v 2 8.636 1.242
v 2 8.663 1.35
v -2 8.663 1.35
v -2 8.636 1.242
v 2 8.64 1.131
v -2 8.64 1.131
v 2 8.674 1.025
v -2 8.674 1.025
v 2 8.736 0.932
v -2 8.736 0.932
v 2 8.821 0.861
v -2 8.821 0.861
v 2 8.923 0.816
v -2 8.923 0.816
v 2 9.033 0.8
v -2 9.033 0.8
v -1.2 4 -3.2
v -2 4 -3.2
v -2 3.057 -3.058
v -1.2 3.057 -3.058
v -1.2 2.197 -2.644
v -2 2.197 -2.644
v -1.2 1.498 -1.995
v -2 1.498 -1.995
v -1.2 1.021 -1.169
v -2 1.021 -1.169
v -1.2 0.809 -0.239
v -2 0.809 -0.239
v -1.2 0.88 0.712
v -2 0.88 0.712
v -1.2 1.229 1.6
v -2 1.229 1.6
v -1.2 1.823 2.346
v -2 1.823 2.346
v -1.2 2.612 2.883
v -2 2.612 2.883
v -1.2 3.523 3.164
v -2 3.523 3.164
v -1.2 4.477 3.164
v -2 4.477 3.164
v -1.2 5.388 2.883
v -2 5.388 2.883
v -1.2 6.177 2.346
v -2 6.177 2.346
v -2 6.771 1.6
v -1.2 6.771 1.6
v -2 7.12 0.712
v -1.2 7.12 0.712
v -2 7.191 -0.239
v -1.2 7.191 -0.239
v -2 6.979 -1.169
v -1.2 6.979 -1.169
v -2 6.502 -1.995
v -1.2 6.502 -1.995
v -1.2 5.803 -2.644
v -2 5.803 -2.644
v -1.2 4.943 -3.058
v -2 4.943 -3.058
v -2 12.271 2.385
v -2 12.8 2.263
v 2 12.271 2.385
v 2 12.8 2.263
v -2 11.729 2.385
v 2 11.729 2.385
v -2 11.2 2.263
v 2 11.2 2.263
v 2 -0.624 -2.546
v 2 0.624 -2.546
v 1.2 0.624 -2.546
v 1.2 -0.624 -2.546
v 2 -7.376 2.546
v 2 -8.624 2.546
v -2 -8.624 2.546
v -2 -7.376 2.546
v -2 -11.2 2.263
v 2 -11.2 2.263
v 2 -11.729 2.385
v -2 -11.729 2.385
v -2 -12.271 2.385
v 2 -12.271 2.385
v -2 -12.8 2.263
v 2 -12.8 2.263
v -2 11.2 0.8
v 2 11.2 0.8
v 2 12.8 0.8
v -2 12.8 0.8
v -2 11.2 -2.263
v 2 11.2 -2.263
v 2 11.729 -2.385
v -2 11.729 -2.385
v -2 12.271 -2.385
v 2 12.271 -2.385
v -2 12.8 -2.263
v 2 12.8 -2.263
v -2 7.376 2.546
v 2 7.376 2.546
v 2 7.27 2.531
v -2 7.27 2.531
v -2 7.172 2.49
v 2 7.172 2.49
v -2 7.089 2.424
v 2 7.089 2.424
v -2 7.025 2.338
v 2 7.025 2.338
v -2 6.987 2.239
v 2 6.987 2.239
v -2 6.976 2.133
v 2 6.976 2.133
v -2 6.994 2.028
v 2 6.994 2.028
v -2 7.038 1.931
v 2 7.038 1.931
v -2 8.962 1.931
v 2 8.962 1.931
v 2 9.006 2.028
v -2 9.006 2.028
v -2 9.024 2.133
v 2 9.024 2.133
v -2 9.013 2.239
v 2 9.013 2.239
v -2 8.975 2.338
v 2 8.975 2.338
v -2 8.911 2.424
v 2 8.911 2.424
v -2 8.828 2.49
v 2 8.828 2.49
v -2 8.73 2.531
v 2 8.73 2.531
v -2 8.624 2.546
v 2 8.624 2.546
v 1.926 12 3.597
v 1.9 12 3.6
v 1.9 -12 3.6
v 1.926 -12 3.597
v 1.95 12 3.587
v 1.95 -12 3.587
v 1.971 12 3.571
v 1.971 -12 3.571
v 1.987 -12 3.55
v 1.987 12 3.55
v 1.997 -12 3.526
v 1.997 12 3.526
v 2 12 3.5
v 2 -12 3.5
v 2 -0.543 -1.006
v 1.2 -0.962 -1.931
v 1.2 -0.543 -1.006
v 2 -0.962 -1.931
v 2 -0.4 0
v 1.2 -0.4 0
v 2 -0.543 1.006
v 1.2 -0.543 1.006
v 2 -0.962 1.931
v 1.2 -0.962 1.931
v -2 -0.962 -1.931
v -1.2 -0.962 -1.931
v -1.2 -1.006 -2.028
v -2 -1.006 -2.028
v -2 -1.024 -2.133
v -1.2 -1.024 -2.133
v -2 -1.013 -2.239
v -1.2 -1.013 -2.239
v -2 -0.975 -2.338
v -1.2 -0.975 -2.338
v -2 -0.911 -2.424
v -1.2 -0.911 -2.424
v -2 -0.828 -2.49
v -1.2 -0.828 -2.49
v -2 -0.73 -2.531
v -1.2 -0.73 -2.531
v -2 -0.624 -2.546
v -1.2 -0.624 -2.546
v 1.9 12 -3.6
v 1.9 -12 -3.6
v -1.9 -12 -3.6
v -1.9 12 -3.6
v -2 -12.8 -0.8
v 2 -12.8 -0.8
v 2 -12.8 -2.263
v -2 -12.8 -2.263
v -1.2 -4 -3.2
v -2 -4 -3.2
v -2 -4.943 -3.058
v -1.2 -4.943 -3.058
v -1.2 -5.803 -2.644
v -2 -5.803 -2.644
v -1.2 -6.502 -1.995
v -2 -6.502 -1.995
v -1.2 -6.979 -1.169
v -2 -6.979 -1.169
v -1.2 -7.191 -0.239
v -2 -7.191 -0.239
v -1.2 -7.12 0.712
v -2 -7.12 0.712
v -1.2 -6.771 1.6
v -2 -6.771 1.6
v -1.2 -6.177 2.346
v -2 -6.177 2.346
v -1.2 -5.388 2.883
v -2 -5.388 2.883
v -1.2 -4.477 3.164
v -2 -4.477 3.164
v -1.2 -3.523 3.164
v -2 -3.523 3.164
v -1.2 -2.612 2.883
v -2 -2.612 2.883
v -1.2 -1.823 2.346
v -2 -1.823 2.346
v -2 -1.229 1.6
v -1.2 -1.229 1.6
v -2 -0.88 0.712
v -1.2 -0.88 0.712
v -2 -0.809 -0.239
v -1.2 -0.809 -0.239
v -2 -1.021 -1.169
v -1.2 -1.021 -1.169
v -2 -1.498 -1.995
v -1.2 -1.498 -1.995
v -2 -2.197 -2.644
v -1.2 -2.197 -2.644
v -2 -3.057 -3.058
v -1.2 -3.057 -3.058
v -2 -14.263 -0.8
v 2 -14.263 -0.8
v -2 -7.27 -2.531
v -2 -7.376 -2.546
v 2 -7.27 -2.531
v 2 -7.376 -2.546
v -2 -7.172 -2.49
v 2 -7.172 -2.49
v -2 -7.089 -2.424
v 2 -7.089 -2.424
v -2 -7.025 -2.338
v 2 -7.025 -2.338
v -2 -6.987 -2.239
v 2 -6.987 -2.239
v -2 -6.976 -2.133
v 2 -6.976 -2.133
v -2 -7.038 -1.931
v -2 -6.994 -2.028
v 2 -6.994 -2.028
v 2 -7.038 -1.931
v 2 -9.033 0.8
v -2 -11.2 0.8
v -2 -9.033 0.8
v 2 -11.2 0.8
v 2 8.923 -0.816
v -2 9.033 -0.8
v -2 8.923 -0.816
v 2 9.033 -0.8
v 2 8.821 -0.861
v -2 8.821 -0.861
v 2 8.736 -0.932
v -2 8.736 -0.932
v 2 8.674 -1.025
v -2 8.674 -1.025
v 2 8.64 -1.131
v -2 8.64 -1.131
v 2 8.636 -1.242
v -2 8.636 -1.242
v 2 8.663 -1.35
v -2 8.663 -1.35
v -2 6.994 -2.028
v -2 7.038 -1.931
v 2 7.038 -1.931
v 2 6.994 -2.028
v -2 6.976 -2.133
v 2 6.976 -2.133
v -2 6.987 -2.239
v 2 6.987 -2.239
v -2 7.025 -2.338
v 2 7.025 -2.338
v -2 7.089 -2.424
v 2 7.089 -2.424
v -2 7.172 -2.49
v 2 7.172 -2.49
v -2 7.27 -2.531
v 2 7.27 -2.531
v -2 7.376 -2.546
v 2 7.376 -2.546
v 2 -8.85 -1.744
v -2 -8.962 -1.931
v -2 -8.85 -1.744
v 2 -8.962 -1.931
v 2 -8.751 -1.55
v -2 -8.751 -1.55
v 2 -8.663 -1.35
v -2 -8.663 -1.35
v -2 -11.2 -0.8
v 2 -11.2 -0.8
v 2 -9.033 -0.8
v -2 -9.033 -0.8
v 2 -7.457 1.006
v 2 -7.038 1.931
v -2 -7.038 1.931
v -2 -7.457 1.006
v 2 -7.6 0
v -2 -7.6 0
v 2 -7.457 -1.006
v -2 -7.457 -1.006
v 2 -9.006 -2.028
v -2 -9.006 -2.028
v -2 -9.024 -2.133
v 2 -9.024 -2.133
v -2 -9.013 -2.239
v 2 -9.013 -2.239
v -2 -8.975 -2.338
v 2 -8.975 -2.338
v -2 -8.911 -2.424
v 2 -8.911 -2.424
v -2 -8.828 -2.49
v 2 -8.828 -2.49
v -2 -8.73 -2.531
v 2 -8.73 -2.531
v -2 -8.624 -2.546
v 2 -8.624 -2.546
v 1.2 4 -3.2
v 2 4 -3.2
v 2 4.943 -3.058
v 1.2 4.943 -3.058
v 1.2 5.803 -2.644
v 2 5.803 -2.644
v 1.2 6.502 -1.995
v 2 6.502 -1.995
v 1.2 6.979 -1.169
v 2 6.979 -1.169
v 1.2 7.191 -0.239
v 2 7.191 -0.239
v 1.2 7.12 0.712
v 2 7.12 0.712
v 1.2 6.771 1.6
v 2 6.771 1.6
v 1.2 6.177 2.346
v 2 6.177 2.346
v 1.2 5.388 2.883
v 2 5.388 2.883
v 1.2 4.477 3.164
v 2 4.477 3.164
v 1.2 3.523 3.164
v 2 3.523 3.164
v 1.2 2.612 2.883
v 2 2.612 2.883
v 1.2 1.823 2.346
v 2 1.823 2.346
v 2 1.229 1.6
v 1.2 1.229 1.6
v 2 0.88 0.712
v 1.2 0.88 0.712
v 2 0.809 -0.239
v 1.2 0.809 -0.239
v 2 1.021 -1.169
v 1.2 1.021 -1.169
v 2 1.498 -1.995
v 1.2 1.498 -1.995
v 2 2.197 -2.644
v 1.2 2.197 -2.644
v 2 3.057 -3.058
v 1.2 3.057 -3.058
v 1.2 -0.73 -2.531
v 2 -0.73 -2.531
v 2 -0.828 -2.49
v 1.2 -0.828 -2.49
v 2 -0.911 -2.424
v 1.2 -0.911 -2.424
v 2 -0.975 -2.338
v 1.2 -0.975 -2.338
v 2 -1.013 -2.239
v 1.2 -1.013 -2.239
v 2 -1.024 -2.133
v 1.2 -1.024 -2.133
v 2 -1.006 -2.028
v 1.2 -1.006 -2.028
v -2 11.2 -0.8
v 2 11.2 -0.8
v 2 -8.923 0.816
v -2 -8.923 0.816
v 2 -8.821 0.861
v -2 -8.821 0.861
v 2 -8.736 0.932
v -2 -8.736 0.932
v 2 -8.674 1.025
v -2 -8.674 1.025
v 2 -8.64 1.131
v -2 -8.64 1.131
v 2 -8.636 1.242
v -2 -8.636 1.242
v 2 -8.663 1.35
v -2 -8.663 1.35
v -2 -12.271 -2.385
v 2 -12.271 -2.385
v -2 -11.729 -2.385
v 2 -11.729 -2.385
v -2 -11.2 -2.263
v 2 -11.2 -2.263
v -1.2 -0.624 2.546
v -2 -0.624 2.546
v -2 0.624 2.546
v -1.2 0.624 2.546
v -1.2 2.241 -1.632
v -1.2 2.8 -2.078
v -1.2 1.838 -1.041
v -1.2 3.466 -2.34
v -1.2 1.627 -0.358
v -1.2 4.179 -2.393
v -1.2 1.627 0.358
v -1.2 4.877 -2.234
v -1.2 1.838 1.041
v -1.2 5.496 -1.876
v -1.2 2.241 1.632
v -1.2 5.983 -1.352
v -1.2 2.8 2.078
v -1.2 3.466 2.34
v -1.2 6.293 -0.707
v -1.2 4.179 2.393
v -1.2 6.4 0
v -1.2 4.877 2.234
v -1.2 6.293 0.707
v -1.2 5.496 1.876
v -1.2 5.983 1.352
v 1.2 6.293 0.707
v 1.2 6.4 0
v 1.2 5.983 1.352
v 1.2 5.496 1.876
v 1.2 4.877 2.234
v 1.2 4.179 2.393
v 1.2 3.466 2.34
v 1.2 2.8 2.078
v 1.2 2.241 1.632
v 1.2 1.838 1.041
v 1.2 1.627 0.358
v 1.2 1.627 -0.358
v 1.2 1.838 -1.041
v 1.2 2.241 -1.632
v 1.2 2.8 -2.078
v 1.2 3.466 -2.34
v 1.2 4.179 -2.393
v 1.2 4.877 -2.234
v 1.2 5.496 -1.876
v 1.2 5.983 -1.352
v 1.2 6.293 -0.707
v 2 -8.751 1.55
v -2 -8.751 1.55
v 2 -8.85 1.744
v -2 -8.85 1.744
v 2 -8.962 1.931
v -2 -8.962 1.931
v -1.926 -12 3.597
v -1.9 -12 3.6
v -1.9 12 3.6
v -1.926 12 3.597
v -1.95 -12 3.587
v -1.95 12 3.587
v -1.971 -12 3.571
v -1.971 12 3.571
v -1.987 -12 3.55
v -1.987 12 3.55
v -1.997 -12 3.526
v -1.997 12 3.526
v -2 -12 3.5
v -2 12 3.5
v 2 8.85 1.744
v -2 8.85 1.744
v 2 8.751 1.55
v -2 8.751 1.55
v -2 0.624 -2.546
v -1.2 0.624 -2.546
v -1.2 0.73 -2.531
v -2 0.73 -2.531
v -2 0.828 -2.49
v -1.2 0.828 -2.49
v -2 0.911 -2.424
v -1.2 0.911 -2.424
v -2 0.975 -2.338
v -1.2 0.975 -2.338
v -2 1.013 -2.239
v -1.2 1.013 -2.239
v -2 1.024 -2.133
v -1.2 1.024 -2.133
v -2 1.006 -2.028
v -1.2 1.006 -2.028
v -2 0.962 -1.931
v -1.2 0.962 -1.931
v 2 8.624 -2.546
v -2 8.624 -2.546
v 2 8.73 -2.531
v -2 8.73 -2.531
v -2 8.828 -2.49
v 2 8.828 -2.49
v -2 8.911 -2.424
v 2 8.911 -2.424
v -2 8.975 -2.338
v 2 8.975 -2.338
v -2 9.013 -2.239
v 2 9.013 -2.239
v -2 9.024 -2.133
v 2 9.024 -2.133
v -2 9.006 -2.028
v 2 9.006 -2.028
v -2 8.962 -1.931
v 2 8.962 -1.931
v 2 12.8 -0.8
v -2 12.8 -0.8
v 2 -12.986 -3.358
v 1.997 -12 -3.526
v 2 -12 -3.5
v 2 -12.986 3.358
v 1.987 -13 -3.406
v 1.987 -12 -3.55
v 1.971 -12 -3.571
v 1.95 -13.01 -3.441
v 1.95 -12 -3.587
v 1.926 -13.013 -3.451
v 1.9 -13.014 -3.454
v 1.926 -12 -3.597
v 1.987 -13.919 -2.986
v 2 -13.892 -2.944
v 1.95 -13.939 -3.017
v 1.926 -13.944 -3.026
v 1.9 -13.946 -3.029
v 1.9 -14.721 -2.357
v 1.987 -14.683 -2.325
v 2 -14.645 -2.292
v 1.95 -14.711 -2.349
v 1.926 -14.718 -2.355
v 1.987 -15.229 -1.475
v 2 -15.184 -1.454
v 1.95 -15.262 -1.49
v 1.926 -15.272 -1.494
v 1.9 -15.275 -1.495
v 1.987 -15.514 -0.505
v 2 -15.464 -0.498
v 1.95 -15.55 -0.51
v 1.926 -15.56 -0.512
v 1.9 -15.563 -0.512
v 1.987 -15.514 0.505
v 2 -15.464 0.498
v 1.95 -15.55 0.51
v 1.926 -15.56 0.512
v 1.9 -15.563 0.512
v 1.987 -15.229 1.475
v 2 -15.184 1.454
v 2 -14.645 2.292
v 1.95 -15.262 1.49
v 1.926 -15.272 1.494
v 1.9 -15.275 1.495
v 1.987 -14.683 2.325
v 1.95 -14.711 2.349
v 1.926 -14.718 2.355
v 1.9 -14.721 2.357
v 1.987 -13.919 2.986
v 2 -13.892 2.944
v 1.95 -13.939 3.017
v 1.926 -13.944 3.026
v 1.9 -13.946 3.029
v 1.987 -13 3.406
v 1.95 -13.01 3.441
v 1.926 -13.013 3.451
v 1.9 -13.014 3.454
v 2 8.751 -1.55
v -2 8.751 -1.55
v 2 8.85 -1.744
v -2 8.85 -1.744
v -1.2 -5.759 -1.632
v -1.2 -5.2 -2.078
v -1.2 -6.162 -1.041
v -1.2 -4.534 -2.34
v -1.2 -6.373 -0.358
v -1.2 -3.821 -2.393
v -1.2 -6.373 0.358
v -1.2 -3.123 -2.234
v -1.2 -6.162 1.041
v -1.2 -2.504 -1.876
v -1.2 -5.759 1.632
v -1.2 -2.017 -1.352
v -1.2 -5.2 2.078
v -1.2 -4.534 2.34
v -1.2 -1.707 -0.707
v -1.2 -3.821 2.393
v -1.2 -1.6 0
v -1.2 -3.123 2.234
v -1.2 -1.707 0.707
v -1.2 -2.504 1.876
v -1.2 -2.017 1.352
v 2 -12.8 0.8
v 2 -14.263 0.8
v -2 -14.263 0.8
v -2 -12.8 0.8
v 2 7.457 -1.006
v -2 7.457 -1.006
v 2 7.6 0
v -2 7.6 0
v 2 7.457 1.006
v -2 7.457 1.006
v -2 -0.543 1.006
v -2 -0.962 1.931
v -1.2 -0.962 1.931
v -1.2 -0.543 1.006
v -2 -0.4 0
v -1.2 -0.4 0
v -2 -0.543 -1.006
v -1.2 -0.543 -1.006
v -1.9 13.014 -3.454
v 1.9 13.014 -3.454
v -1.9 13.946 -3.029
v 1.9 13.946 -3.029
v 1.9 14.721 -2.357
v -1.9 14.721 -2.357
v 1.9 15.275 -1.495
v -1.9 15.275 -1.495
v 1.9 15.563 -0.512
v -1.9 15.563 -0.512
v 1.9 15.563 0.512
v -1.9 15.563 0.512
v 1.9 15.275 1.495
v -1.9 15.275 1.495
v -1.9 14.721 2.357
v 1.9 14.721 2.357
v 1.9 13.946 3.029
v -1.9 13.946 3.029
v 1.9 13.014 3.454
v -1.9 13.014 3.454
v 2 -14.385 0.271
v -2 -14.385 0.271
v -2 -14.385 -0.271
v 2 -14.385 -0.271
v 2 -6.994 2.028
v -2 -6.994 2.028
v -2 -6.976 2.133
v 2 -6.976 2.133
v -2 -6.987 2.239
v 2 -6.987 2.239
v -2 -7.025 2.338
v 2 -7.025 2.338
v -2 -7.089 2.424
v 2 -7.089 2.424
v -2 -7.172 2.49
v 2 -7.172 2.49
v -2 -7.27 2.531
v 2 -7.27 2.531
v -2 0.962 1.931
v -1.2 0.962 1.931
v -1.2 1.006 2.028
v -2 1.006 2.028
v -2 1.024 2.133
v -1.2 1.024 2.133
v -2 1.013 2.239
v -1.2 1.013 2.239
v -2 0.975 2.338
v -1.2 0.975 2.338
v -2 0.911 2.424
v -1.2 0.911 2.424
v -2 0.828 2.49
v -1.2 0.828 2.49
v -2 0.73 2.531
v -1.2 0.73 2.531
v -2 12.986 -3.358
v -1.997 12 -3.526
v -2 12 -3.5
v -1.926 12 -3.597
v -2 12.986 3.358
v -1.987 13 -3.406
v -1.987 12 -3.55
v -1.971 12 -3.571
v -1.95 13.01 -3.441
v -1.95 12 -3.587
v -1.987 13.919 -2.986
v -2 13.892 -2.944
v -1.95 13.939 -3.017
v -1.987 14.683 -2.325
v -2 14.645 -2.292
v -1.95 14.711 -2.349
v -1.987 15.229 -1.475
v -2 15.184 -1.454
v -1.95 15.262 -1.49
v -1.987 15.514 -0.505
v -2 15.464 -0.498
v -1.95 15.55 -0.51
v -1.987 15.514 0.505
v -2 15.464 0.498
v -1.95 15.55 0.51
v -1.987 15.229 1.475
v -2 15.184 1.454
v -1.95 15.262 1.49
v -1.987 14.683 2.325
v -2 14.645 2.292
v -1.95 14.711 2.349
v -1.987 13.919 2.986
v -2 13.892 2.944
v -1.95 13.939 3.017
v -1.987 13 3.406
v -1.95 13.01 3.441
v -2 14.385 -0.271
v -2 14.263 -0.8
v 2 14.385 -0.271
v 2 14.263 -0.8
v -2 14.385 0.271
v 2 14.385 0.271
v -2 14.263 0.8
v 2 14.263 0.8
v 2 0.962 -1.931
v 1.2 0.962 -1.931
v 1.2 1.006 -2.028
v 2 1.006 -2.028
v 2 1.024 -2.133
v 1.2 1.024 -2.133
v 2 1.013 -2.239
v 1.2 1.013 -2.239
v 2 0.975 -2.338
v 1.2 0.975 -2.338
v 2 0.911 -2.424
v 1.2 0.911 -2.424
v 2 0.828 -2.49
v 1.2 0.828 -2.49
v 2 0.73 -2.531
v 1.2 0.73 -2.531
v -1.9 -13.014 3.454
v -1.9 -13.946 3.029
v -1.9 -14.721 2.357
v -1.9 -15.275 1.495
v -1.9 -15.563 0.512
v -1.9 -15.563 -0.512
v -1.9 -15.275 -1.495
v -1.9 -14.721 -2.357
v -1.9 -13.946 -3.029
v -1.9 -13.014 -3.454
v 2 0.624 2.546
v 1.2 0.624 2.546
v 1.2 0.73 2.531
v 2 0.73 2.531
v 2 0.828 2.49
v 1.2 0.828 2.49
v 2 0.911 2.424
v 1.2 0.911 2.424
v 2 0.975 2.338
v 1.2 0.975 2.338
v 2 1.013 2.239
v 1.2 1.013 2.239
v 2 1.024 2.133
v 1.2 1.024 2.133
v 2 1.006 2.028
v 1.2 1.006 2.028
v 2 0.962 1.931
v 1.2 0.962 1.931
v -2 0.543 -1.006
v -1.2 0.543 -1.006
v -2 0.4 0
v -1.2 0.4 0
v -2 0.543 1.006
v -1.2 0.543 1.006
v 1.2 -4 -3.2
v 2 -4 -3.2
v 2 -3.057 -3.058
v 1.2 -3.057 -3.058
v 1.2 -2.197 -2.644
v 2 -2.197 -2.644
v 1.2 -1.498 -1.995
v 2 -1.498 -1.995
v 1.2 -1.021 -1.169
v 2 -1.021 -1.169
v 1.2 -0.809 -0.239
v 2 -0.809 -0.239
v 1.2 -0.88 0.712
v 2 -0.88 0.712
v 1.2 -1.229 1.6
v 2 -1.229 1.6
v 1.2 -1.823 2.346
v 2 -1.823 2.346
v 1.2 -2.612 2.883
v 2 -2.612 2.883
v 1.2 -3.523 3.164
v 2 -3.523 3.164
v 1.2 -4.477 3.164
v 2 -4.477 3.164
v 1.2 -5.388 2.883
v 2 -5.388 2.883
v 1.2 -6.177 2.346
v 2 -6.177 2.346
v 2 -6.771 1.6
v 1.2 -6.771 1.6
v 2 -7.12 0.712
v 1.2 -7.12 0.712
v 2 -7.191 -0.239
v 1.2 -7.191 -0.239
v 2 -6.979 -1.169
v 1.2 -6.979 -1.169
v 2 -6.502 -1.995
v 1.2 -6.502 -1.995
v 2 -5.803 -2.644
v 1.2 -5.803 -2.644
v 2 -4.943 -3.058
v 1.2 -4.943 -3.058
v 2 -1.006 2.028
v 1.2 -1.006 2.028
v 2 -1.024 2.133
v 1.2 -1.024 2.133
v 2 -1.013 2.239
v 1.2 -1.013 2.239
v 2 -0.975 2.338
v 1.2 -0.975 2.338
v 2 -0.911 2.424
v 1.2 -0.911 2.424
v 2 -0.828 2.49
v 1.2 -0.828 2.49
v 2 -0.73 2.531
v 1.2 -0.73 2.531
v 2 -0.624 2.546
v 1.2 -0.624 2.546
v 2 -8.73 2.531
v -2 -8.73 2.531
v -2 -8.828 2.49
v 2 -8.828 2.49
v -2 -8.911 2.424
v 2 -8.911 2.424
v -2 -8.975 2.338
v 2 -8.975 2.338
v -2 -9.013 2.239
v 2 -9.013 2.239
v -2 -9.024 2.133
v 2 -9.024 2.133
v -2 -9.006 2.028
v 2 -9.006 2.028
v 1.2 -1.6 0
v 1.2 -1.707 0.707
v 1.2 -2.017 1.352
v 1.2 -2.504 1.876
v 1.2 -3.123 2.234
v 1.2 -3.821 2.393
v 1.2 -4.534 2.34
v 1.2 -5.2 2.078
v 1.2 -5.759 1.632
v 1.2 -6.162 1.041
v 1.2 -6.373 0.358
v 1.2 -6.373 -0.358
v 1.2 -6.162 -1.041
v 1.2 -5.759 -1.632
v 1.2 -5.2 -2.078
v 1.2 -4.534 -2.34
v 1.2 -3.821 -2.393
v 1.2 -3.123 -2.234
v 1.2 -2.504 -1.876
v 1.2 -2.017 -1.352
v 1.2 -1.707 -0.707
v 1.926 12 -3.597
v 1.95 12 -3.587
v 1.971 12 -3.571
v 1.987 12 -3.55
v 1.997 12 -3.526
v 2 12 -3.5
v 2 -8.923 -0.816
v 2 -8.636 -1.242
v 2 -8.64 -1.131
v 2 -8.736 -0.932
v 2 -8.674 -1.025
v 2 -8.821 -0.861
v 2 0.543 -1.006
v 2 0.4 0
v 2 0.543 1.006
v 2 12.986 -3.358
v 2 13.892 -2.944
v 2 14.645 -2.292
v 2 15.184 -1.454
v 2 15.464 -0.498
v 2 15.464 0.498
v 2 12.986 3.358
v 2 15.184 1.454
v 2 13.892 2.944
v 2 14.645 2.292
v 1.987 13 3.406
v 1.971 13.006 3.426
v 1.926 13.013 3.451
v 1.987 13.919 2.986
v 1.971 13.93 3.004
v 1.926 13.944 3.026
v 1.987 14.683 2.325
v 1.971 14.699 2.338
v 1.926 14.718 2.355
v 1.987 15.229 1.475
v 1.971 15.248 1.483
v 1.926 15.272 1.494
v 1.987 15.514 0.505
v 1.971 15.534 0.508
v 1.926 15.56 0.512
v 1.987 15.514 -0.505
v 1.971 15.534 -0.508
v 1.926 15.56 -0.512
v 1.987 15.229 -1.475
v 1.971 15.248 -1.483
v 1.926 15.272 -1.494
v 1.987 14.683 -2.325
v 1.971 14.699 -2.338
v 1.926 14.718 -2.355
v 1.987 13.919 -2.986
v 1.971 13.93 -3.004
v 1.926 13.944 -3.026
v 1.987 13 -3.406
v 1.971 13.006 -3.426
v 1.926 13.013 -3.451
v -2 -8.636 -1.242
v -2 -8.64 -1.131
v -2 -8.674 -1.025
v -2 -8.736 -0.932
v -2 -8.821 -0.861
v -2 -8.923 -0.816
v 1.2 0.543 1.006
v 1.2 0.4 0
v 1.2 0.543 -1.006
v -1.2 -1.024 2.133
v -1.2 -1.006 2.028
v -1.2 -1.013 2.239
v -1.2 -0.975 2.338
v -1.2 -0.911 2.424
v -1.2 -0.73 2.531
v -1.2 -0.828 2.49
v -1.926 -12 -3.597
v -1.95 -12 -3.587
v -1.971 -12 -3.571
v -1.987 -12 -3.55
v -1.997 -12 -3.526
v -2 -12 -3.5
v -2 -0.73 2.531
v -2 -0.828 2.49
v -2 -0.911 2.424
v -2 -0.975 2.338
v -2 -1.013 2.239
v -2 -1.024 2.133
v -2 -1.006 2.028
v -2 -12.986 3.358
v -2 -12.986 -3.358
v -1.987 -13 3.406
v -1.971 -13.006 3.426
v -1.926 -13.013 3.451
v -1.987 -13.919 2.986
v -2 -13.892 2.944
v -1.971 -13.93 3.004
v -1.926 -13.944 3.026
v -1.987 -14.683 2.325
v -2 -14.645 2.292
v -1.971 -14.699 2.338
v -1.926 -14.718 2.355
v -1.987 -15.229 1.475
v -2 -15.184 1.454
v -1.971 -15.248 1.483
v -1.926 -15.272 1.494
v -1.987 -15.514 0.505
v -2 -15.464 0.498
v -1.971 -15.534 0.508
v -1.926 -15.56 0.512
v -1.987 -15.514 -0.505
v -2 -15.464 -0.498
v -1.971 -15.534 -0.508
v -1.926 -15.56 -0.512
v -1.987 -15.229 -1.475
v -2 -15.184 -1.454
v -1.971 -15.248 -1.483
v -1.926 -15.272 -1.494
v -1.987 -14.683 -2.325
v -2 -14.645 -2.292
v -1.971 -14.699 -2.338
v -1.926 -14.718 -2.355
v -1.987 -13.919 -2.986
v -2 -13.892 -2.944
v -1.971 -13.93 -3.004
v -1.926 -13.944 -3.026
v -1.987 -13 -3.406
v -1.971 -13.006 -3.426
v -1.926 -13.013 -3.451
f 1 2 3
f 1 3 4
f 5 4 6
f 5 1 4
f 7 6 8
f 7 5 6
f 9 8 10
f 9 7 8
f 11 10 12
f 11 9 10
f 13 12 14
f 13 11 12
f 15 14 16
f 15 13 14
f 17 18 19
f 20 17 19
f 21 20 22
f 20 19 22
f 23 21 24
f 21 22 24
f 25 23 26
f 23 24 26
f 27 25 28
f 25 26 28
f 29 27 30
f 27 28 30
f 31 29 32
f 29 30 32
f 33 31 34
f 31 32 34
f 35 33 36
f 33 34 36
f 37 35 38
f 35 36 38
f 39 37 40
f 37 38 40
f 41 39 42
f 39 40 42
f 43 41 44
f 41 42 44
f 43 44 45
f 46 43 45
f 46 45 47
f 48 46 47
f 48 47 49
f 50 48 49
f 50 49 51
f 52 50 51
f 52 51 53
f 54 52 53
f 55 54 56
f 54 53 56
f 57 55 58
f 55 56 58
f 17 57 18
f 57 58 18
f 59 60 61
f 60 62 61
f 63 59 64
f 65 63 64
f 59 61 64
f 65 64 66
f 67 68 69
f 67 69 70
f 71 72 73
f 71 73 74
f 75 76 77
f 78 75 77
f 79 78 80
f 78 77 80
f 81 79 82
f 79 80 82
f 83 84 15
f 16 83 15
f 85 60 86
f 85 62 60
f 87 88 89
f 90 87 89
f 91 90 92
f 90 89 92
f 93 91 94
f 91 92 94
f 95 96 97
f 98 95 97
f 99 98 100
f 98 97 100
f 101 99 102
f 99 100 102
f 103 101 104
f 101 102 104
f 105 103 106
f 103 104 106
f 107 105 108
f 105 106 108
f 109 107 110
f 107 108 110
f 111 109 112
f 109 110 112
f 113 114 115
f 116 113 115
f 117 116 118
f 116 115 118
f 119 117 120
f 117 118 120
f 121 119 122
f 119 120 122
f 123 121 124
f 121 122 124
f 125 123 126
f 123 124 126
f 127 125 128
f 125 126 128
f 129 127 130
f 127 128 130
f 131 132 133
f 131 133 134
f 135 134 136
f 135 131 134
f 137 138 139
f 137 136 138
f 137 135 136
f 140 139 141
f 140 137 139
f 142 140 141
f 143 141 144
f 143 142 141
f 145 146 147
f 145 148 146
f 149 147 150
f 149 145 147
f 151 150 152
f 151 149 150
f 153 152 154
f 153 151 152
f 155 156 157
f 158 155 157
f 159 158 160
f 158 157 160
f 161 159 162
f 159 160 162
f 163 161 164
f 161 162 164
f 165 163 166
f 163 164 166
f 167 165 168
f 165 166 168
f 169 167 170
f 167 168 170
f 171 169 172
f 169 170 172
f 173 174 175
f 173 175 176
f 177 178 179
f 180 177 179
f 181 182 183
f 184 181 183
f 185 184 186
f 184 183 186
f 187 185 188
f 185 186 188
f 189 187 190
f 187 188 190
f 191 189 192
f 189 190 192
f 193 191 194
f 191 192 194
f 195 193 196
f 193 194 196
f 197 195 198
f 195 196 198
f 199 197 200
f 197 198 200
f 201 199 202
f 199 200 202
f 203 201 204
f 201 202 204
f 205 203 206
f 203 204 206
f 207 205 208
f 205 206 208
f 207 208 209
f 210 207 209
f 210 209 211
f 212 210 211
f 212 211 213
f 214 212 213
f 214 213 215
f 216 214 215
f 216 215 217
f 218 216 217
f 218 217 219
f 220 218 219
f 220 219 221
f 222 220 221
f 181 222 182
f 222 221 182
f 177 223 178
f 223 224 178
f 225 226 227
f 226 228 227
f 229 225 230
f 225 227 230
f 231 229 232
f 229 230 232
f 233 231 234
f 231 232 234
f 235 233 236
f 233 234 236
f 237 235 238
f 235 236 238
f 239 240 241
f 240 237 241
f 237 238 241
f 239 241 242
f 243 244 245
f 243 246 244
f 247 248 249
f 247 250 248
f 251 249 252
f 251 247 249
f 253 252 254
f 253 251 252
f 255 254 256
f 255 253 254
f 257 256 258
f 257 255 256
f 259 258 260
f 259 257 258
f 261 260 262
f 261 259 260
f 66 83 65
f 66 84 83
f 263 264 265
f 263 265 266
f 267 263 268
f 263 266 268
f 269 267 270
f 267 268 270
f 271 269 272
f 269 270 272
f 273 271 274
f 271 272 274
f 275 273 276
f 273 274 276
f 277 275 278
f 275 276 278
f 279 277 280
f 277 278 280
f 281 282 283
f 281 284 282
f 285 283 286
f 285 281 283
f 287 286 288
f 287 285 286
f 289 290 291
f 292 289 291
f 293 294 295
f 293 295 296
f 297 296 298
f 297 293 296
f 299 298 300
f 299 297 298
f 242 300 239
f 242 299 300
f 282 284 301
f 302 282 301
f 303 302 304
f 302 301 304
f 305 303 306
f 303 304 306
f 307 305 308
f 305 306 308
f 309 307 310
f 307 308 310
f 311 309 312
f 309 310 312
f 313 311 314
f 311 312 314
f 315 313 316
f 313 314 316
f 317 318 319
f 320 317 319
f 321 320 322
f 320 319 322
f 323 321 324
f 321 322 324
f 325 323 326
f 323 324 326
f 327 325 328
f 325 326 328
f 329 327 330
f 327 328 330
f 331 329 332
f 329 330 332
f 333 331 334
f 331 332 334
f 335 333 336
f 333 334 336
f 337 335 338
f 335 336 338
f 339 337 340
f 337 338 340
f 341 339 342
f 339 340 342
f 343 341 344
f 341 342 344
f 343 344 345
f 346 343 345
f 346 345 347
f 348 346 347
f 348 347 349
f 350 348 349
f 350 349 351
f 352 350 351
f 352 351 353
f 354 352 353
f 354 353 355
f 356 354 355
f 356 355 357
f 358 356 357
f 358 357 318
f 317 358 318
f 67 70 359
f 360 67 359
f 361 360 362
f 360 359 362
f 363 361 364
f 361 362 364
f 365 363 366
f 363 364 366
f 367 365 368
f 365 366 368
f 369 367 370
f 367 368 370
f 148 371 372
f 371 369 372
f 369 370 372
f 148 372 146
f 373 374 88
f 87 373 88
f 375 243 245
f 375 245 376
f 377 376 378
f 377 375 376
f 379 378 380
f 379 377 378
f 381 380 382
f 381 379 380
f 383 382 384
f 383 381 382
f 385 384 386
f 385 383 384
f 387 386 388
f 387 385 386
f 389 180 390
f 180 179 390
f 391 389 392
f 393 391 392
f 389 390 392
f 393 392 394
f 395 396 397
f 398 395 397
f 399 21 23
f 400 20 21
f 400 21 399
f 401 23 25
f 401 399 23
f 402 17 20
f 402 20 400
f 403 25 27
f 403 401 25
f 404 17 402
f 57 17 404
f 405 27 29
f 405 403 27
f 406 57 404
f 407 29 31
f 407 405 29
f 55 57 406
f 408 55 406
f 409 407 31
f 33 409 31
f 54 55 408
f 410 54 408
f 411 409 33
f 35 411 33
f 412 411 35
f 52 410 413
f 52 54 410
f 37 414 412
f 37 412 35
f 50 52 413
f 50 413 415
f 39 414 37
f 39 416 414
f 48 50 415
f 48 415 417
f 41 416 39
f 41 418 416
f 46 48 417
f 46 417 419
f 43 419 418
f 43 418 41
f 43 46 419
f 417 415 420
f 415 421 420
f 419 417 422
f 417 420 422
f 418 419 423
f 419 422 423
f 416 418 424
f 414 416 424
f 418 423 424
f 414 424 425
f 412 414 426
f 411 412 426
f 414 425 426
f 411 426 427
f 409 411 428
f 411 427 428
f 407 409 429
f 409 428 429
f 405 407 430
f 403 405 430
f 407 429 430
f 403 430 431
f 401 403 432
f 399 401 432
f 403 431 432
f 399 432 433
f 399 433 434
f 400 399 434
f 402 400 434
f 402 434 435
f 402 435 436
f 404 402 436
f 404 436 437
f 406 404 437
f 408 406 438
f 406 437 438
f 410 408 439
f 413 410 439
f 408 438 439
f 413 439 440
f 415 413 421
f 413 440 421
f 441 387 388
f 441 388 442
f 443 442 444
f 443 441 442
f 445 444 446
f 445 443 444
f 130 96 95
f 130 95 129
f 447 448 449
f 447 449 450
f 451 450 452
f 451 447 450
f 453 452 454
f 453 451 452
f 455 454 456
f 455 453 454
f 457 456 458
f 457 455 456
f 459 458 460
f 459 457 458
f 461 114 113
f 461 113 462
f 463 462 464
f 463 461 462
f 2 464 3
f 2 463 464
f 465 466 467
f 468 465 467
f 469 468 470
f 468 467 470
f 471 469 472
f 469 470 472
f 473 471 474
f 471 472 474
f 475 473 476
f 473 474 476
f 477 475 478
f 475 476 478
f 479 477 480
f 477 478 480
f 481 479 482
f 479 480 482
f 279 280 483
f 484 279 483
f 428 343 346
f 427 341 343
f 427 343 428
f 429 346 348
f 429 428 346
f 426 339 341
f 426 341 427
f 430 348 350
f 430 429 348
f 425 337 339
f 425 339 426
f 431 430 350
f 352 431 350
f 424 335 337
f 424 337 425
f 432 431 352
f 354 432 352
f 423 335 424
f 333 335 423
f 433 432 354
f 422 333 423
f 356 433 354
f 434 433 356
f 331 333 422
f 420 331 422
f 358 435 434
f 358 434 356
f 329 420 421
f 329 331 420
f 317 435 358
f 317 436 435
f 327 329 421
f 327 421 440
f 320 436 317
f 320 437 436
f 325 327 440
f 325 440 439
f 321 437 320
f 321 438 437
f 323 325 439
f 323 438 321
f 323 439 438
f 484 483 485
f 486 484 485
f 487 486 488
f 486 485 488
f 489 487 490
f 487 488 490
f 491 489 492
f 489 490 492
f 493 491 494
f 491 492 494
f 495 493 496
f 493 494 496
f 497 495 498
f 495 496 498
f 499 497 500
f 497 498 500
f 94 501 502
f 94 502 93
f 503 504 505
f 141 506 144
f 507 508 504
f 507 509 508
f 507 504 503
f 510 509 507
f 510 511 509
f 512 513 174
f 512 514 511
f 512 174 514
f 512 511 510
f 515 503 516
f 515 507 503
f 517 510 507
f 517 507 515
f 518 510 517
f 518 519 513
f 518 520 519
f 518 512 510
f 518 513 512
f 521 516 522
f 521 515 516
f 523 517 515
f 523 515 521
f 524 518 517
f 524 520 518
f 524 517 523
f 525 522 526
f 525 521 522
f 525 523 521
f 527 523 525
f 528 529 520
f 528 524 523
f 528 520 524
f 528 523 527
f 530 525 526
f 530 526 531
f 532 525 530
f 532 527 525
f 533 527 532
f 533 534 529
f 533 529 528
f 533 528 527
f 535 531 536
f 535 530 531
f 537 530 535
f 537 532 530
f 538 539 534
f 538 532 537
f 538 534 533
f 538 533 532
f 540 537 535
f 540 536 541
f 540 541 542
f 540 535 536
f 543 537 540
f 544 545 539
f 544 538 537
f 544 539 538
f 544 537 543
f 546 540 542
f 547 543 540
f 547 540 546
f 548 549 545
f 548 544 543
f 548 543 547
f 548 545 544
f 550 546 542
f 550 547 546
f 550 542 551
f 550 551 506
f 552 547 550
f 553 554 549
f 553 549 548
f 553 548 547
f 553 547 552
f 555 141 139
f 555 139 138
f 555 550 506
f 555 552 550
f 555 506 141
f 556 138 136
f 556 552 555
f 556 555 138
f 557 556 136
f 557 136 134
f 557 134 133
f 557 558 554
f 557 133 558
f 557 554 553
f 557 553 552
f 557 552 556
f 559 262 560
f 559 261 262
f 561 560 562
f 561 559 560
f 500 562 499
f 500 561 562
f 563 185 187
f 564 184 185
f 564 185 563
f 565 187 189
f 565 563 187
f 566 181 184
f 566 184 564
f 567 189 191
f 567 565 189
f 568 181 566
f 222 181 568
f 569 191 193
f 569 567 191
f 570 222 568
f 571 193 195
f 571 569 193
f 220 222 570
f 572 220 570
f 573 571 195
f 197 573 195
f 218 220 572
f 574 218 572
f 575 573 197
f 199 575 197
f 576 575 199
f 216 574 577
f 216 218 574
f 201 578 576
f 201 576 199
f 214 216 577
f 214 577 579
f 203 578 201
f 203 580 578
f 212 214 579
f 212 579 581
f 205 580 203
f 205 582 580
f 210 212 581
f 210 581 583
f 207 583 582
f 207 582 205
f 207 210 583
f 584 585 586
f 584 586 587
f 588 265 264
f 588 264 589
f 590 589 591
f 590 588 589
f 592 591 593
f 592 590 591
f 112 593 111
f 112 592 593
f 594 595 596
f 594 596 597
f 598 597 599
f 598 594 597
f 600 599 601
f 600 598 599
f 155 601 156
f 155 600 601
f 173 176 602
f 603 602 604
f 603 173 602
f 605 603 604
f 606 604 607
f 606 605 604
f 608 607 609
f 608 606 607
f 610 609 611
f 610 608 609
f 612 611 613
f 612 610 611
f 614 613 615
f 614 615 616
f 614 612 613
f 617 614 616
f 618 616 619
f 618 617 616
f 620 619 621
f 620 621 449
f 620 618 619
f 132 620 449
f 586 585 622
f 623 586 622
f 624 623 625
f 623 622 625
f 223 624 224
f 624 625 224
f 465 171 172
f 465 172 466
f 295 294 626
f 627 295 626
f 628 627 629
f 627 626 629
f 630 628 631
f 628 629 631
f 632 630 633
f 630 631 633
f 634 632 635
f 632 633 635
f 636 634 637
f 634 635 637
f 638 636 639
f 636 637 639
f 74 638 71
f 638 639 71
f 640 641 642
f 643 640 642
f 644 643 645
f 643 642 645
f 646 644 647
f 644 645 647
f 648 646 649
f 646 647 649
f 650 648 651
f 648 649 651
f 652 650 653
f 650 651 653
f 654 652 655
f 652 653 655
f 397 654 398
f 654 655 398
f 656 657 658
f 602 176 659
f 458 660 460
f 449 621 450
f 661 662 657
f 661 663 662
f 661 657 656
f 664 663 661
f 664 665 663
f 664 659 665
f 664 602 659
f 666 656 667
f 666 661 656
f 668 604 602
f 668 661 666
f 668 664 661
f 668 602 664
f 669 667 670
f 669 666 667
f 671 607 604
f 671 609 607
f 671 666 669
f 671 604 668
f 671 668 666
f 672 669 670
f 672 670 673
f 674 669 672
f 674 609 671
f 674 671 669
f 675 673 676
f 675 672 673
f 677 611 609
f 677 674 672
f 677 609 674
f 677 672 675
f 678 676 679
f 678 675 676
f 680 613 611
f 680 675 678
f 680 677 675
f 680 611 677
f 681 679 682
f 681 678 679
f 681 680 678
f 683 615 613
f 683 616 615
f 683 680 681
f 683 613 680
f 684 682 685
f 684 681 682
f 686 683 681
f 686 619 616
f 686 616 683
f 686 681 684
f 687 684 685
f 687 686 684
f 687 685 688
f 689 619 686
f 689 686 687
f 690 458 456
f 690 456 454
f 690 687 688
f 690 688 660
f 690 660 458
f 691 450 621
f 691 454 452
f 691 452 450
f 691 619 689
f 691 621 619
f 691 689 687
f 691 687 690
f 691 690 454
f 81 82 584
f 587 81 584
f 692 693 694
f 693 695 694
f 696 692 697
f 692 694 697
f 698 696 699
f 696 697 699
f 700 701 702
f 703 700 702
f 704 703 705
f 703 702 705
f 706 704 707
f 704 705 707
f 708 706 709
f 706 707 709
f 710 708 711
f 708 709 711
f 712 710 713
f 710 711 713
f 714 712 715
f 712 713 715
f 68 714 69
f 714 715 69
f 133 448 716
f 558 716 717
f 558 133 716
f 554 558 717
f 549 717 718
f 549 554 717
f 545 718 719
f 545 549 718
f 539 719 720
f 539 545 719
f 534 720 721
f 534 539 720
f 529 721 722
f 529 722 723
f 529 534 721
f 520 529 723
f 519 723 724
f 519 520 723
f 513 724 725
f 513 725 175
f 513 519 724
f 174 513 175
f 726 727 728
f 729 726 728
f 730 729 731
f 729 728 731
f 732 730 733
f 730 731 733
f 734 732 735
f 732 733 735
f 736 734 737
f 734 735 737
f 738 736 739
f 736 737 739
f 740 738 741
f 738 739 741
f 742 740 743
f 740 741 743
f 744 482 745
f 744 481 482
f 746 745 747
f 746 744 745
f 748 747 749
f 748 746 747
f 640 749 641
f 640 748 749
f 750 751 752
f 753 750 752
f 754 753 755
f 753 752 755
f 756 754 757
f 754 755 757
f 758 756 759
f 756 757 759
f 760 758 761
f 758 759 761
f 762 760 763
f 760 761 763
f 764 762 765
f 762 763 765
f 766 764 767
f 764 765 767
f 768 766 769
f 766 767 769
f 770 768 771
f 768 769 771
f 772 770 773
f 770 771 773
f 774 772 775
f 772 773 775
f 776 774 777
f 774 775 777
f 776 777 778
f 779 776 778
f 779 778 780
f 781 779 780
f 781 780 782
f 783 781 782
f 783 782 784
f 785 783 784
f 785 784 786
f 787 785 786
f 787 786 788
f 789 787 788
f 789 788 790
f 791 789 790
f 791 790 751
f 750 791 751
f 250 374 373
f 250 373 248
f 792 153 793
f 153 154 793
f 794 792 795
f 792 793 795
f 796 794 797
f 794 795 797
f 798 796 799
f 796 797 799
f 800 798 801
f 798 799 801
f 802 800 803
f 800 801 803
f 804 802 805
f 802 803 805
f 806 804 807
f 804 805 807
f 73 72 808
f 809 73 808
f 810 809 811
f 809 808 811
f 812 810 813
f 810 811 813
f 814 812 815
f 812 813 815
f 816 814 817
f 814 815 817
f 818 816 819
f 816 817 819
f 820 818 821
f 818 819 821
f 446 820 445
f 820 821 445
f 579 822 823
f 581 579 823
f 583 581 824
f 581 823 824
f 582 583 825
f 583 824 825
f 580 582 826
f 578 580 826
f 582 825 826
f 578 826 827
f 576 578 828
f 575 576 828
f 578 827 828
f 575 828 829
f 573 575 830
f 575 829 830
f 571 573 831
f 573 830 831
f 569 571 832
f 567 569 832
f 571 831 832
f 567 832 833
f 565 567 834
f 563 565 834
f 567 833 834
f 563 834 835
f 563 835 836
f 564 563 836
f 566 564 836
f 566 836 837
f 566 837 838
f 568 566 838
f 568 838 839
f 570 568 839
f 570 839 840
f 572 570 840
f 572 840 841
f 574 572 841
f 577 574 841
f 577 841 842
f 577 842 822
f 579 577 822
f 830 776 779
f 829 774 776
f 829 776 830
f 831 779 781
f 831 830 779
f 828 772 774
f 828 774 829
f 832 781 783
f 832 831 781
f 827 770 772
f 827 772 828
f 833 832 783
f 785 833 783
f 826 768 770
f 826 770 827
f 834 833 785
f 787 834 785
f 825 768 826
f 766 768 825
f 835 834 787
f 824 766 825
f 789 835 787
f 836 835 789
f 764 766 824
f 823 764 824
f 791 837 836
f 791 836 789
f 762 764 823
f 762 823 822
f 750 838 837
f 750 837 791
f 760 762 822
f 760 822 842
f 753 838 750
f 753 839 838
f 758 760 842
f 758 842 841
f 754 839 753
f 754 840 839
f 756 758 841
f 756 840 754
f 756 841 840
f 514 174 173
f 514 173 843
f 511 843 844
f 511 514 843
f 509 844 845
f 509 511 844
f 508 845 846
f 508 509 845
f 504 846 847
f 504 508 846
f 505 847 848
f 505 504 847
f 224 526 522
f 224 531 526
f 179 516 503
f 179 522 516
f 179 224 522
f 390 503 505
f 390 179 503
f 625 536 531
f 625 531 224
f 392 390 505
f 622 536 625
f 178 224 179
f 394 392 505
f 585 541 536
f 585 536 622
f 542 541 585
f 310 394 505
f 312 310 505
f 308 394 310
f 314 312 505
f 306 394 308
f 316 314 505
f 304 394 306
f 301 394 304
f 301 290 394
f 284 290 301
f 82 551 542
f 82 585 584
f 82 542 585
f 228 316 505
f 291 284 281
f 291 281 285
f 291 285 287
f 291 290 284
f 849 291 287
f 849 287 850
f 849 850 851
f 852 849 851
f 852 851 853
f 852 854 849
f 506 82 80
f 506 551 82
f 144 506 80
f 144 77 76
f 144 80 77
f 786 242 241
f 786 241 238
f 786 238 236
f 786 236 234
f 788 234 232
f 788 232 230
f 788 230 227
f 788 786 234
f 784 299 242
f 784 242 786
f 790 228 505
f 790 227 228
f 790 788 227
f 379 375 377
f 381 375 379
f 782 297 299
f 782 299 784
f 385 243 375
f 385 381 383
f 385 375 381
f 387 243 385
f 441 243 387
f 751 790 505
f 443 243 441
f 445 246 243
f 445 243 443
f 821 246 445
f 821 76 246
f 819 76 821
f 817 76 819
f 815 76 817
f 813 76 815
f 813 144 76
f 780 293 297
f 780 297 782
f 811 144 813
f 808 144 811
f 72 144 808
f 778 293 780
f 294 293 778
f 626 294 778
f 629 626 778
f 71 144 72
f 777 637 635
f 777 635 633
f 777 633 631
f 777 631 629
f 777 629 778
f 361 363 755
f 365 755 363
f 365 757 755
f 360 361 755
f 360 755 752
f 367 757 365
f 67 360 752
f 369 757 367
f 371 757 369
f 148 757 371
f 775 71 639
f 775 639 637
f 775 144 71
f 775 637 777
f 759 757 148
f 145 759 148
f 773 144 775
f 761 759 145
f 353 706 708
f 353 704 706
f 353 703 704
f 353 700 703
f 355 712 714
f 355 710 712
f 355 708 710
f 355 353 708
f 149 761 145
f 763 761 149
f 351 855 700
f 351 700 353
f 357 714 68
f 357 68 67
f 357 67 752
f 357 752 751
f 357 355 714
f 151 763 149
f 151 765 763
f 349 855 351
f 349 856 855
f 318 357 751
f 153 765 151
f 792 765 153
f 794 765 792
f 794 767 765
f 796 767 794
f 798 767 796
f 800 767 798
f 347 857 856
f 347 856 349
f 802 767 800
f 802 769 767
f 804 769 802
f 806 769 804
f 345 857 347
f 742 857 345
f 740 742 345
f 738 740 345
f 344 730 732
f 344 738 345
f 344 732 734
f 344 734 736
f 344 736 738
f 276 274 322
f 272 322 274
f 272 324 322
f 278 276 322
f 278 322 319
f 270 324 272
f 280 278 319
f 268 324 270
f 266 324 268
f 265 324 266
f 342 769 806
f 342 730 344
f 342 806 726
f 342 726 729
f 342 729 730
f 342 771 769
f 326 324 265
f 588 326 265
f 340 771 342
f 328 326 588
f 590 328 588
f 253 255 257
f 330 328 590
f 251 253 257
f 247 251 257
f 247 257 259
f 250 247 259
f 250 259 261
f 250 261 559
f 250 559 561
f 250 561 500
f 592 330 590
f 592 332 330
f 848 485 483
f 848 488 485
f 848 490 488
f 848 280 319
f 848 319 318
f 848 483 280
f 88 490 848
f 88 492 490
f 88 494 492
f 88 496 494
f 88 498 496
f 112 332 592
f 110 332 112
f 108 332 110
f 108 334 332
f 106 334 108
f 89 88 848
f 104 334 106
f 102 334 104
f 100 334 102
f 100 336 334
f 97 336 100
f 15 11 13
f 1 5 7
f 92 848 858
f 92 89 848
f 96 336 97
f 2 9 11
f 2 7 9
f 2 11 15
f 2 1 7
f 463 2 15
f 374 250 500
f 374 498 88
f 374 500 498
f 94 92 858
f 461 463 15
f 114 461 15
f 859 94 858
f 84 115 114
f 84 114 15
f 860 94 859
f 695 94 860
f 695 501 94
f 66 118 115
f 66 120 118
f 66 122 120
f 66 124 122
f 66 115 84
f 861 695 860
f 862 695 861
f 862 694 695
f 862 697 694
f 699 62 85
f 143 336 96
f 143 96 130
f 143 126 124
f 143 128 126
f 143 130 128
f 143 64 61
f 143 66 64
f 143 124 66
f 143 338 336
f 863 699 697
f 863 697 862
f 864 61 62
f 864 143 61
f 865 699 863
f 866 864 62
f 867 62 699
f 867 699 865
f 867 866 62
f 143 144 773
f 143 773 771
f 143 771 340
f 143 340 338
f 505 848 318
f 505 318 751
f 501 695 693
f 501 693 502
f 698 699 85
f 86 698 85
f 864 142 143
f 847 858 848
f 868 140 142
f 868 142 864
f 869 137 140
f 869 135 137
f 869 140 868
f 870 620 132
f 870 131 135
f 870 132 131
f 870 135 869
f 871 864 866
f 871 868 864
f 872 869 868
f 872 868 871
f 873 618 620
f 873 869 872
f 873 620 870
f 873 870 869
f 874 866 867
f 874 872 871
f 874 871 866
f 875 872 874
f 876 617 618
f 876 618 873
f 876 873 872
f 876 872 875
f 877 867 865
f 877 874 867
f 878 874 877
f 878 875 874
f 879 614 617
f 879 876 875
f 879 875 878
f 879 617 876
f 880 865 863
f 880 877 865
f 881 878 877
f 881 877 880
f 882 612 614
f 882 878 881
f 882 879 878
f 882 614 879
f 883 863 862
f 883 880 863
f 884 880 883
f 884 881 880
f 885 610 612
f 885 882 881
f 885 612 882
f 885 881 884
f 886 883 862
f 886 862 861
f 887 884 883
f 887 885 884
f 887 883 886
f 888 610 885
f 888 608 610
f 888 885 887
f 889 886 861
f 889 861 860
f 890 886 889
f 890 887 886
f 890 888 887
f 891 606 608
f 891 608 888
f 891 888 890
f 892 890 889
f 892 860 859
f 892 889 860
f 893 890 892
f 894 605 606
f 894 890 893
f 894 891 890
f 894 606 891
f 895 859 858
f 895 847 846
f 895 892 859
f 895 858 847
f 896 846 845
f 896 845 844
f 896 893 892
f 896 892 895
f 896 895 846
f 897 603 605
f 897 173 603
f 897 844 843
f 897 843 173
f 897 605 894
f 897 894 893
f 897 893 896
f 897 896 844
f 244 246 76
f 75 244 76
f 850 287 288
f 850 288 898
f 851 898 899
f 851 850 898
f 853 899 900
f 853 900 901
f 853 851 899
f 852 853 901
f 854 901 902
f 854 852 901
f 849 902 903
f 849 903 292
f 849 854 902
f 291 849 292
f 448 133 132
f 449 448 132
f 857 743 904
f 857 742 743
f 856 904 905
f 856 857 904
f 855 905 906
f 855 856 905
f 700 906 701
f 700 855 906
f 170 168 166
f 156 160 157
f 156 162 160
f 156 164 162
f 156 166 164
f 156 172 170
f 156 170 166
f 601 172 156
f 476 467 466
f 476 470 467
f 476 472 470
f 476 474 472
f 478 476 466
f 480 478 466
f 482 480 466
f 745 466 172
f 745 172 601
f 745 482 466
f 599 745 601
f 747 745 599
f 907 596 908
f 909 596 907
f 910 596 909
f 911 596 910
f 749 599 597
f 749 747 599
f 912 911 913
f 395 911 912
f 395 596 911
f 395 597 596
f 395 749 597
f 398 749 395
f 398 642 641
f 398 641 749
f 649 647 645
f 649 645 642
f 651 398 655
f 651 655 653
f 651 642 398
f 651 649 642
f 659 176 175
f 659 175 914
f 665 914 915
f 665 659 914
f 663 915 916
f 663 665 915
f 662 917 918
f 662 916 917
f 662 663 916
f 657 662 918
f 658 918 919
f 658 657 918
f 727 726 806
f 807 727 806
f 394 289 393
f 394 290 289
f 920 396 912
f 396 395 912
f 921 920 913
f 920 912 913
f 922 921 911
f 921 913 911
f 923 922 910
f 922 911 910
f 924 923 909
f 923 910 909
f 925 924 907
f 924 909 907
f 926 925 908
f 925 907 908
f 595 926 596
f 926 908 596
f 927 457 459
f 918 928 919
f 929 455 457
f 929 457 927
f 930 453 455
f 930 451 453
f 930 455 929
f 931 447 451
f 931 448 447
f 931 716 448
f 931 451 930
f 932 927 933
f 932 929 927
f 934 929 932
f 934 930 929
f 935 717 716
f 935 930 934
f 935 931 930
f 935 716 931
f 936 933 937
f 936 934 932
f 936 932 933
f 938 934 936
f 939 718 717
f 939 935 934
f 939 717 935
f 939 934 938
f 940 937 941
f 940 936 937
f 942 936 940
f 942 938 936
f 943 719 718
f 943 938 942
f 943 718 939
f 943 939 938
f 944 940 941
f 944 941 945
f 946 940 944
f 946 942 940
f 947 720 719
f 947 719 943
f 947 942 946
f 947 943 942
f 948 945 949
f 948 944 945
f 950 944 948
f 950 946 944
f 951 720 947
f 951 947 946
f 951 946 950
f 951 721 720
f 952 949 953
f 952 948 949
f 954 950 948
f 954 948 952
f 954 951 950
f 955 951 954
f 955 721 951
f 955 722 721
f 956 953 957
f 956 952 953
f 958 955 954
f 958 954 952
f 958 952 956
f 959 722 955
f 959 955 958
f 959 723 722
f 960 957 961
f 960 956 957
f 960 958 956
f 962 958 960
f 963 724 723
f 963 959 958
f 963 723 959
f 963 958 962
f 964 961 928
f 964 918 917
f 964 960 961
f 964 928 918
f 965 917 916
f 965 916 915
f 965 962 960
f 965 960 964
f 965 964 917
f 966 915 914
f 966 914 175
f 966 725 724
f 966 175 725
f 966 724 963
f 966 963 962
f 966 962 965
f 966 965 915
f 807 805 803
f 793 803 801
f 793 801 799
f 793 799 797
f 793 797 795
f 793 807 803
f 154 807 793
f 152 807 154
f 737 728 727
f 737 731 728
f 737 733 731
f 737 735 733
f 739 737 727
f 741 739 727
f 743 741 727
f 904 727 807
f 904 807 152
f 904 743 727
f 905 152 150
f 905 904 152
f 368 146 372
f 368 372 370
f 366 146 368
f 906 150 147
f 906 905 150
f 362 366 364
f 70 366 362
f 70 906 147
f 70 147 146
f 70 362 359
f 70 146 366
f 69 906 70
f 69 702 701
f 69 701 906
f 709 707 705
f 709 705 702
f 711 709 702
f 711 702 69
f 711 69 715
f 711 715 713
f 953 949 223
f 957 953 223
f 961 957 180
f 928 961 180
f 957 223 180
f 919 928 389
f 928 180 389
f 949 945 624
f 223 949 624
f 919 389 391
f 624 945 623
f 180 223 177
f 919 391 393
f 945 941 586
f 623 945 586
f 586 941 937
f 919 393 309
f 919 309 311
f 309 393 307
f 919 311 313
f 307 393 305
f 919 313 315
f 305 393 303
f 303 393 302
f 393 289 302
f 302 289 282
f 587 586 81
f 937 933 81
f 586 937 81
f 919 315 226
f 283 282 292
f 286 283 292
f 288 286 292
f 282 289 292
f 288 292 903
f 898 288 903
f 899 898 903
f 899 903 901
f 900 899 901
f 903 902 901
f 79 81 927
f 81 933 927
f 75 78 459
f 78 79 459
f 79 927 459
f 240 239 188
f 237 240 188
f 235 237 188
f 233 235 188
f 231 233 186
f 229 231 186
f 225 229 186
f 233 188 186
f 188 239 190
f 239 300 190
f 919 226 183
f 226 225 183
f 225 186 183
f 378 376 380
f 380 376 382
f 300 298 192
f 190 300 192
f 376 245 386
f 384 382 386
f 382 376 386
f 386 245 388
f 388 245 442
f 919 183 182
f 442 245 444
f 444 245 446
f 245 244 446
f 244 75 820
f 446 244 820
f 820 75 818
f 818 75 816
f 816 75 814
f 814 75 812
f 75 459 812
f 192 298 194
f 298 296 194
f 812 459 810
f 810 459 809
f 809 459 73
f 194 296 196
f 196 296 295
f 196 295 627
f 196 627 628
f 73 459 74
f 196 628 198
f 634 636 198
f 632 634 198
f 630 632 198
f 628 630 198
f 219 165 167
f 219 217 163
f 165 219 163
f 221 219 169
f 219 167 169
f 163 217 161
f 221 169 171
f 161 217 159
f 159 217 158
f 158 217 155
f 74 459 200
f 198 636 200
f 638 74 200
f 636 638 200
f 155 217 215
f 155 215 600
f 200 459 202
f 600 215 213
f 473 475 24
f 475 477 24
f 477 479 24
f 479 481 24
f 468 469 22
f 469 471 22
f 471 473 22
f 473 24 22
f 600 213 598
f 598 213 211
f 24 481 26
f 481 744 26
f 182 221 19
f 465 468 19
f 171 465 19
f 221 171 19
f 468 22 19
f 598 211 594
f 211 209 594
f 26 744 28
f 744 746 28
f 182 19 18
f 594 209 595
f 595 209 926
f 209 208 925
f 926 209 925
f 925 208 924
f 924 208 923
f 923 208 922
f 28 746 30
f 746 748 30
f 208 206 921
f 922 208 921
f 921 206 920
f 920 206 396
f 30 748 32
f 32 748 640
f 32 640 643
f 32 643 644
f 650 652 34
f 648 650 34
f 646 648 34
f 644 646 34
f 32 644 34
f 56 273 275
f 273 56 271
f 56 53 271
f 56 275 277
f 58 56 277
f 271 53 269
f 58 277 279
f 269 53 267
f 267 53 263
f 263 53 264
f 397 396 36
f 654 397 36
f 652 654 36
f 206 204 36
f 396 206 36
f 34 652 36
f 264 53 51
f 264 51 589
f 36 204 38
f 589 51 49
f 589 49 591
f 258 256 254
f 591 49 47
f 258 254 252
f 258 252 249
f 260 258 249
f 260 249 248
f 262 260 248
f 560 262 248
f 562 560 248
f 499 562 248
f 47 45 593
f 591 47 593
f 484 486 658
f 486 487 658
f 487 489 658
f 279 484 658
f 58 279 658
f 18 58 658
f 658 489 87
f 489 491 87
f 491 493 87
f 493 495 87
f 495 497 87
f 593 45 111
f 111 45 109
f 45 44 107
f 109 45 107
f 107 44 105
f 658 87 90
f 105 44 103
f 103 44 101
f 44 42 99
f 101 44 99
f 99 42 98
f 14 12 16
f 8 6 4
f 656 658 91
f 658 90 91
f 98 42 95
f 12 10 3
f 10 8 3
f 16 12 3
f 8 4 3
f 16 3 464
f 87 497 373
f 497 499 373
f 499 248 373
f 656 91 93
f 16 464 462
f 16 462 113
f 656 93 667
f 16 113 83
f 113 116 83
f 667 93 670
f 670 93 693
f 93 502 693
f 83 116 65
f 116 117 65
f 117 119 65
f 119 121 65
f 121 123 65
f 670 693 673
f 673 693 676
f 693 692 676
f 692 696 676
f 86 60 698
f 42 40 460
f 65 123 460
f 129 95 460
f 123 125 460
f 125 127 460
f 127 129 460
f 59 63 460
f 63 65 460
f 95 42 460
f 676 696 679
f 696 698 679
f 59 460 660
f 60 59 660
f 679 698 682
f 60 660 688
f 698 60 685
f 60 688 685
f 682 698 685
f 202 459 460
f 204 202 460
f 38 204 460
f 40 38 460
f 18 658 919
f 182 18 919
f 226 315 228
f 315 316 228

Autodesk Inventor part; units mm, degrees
ref_plane "YZ Plane" through (0, 0, 0) normal (1, 0, 0) x (0, 1, 0)
ref_plane "XZ Plane" through (0, 0, 0) normal (0, 1, 0) x (-1, 0, 0)
ref_plane "XY Plane" through (0, 0, 0) normal (0, 0, 1) x (1, 0, 0)
sketch "Sketch3" plane through (0, 0, 0) normal (1, 0, 0) x (0, 1, 0)
  arc A0 (12.8, 2.2627) -> (11.2, 2.2627) centre (12, 0) ccw
  arc A1 (11.2, -2.2627) -> (12.8, -2.2627) centre (12, 0) ccw
  arc A2 (14.2627, -0.8) -> (14.2627, 0.8) centre (12, 0) ccw
  line L0 (14.2627, 0.8) -> (12.8, 0.8)
  line L1 (11.2, 0.8) -> (8.49, 0.8)
  line L2 (12.8, 2.2627) -> (12.8, 0.8)
  line L3 (12.8, -0.8) -> (12.8, -2.2627)
  line L4 (14.2627, -0.8) -> (12.8, -0.8)
  line L5 (11.2, -0.8) -> (8.49, -0.8)
  arc A3 (12, -3.6) -> (12, 3.6) centre (12, 0) ccw
  line L6 (-12, -3.6) -> (12, -3.6)
  line L7 (-12, 3.6) -> (12, 3.6)
  line L8 (11.2, 0.8) -> (11.2, 2.2627)
  line L9 (11.2, -0.8) -> (11.2, -2.2627)
  arc A4 (-12, 3.6) -> (-12, -3.6) centre (-12, 0) ccw
  line L10 (0, -3.6) -> (0, 3.6) construction
  arc A5 (-11.2, 2.2627) -> (-12.8, 2.2627) centre (-12, 0) ccw
  arc A6 (-12.8, -2.2627) -> (-11.2, -2.2627) centre (-12, 0) ccw
  line L11 (-12.8, -0.8) -> (-12.8, -2.2627)
  line L12 (-12.8, 2.2627) -> (-12.8, 0.8)
  line L13 (-14.2627, -0.8) -> (-12.8, -0.8)
  line L14 (-14.2627, 0.8) -> (-12.8, 0.8)
  arc A7 (-14.2627, 0.8) -> (-14.2627, -0.8) centre (-12, 0) ccw
  line L15 (-11.2, 0.8) -> (-8.49, 0.8)
  line L16 (-11.2, -0.8) -> (-8.49, -0.8)
  line L17 (-11.2, 0.8) -> (-11.2, 2.2627)
  line L18 (-11.2, -0.8) -> (-11.2, -2.2627)
  circle A8 centre (-4, 0) radius 3.2
  circle A9 centre (4, 0) radius 3.2
  line L19 (12, 0) -> (4, 0) construction
  line L20 (4, 0) -> (-4, 0) construction
  line L21 (-4, 0) -> (-12, 0) construction
  circle A10 centre (-4, 0) radius 2.4
  circle A11 centre (4, 0) radius 2.4
  line L22 (-9.4544, 2.5456) -> (-6.5456, 2.5456)
  line L23 (-9.4544, -2.5456) -> (-6.5456, -2.5456)
  line L24 (-1.4544, 2.5456) -> (1.4544, 2.5456)
  line L25 (-1.4544, -2.5456) -> (1.4544, -2.5456)
  line L26 (6.5456, 2.5456) -> (9.4544, 2.5456)
  line L27 (6.5456, -2.5456) -> (9.4544, -2.5456)
  arc A12 (-9.4544, -2.5456) -> (-9.4544, 2.5456) centre (-12, 0) ccw
  arc A13 (-6.5456, 2.5456) -> (-6.5456, -2.5456) centre (-4, 0) ccw
  arc A14 (-1.4544, -2.5456) -> (-1.4544, 2.5456) centre (-4, 0) ccw
  arc A15 (1.4544, 2.5456) -> (1.4544, -2.5456) centre (4, 0) ccw
  arc A16 (6.5456, -2.5456) -> (6.5456, 2.5456) centre (4, 0) ccw
  arc A17 (9.4544, 2.5456) -> (9.4544, -2.5456) centre (12, 0) ccw
  line L28 (-12, 0) -> (-9.4544, 2.5456) construction
  arc A18 (8.49, 0.8) -> (8.49, -0.8) centre (12, 0) ccw
  point P0 (0, 0)
  dimension "d47" = 4.8
  dimension "d49" = 7.2
  dimension "d53" = 1.6
  dimension "d58" = 24
  dimension "d59" = 6.4
  dimension "d60" = 4.8
  dimension "d64" = 45
extrude "Extrusion4" add sketch "Sketch3" along normal mid plane 4 contours L6 A4 L7 A3 | A8 | A9 | L24 A15 L25 A14
sketch "Sketch11" plane through (2, 0, 0) normal (1, 0, 0) x (0, 0, -1)
  circle A0 centre (0, 4) radius 2.4 projected
  circle A1 centre (0, -4) radius 2.4 projected
  circle A2 centre (0, 4) radius 3.2
  circle A3 centre (0, -4) radius 3.2
  arc A4 (2.5456, 6.5456) -> (-2.5456, 6.5456) centre (0, 4) ccw projected
  arc A5 (-2.5456, -6.5456) -> (2.5456, -6.5456) centre (0, -4) ccw projected
  line L0 (-2.2627, -11.2) -> (-0.8, -11.2) projected
  line L1 (-2.5456, 1.4544) -> (-2.5456, -1.4544)
  line L2 (2.5456, 1.4544) -> (2.5456, -1.4544)
  arc A6 (-2.5456, 1.4544) -> (2.5456, 1.4544) centre (0, 4) ccw
  arc A7 (2.5456, -1.4544) -> (-2.5456, -1.4544) centre (0, -4) ccw
  point P0 (0, 0)
  dimension "d61" = 6.4
extrude "Extrusion16" cut sketch "Sketch11" against normal blind 0.8 contours A2 | A3
extrude "Extrusion17" cut sketch "Sketch11" against normal blind 0.8 contours A6 L2 A7 L1
mirror "Mirror3" about plane through (0, 0, 0) normal (1, 0, 0) of "Extrusion16", "Extrusion17"
fillet "Fillet1" radius 0.1 8 edges at (-2, 15.6, 0) (-2, 0, 3.6) (-2, 0, -3.6) (2, 0, 3.6) (2, 0, -3.6) (2, 15.6, 0) (-2, -15.6, 0) (2, -15.6, 0)
fillet "Fillet1" radius 0.4 20 edges at (0, -9.4544, 2.5456) (0, -6.5456, 2.5456) (0, -9.4544, -2.5456) (0, -6.5456, -2.5456) (1.6, -1.4544, -2.5456) (1.6, 1.4544, -2.5456) (1.6, 1.4544, 2.5456) (1.6, -1.4544, 2.5456) (0, 6.5456, 2.5456) (0, 9.4544, 2.5456) (0, 6.5456, -2.5456) (0, 9.4544, -2.5456) (-1.6, -1.4544, 2.5456) (-1.6, -1.4544, -2.5456) (-1.6, 1.4544, -2.5456) (-1.6, 1.4544, 2.5456) (0, -8.49, 0.8) (0, -8.49, -0.8) (0, 8.49, -0.8) (0, 8.49, 0.8)
equation "\"d47\" = kd"
equation "\"d49\" = tlad"
equation "\"d53\" = axlet"
equation "\"d58\" = 3 * lu"
equation "\"d59\" = tsd"
equation "\"d60\" = tpd"
equation "\"d15\" = 0.5 * lu"
equation "\"d61\" = tsd"
equation "\"d62\" = tsl"
equation "\"d65\" = 0.5 * lu - 2 * wall"
equation "\"lf\" = 0.1"
equation "\"tf\" = 0.4"
equation "\"kd\" = 4.8"
equation "\"tlad\" = 7.2"
equation "\"axlet\" = 1.6"
equation "\"lu\" = 8"
equation "\"tsd\" = 6.4"
equation "\"tpd\" = 4.8"
equation "\"tsl\" = 0.8"
equation "\"wall\" = 1.6"
properties part number "32449-Yellow" material "ABS Plastic"
